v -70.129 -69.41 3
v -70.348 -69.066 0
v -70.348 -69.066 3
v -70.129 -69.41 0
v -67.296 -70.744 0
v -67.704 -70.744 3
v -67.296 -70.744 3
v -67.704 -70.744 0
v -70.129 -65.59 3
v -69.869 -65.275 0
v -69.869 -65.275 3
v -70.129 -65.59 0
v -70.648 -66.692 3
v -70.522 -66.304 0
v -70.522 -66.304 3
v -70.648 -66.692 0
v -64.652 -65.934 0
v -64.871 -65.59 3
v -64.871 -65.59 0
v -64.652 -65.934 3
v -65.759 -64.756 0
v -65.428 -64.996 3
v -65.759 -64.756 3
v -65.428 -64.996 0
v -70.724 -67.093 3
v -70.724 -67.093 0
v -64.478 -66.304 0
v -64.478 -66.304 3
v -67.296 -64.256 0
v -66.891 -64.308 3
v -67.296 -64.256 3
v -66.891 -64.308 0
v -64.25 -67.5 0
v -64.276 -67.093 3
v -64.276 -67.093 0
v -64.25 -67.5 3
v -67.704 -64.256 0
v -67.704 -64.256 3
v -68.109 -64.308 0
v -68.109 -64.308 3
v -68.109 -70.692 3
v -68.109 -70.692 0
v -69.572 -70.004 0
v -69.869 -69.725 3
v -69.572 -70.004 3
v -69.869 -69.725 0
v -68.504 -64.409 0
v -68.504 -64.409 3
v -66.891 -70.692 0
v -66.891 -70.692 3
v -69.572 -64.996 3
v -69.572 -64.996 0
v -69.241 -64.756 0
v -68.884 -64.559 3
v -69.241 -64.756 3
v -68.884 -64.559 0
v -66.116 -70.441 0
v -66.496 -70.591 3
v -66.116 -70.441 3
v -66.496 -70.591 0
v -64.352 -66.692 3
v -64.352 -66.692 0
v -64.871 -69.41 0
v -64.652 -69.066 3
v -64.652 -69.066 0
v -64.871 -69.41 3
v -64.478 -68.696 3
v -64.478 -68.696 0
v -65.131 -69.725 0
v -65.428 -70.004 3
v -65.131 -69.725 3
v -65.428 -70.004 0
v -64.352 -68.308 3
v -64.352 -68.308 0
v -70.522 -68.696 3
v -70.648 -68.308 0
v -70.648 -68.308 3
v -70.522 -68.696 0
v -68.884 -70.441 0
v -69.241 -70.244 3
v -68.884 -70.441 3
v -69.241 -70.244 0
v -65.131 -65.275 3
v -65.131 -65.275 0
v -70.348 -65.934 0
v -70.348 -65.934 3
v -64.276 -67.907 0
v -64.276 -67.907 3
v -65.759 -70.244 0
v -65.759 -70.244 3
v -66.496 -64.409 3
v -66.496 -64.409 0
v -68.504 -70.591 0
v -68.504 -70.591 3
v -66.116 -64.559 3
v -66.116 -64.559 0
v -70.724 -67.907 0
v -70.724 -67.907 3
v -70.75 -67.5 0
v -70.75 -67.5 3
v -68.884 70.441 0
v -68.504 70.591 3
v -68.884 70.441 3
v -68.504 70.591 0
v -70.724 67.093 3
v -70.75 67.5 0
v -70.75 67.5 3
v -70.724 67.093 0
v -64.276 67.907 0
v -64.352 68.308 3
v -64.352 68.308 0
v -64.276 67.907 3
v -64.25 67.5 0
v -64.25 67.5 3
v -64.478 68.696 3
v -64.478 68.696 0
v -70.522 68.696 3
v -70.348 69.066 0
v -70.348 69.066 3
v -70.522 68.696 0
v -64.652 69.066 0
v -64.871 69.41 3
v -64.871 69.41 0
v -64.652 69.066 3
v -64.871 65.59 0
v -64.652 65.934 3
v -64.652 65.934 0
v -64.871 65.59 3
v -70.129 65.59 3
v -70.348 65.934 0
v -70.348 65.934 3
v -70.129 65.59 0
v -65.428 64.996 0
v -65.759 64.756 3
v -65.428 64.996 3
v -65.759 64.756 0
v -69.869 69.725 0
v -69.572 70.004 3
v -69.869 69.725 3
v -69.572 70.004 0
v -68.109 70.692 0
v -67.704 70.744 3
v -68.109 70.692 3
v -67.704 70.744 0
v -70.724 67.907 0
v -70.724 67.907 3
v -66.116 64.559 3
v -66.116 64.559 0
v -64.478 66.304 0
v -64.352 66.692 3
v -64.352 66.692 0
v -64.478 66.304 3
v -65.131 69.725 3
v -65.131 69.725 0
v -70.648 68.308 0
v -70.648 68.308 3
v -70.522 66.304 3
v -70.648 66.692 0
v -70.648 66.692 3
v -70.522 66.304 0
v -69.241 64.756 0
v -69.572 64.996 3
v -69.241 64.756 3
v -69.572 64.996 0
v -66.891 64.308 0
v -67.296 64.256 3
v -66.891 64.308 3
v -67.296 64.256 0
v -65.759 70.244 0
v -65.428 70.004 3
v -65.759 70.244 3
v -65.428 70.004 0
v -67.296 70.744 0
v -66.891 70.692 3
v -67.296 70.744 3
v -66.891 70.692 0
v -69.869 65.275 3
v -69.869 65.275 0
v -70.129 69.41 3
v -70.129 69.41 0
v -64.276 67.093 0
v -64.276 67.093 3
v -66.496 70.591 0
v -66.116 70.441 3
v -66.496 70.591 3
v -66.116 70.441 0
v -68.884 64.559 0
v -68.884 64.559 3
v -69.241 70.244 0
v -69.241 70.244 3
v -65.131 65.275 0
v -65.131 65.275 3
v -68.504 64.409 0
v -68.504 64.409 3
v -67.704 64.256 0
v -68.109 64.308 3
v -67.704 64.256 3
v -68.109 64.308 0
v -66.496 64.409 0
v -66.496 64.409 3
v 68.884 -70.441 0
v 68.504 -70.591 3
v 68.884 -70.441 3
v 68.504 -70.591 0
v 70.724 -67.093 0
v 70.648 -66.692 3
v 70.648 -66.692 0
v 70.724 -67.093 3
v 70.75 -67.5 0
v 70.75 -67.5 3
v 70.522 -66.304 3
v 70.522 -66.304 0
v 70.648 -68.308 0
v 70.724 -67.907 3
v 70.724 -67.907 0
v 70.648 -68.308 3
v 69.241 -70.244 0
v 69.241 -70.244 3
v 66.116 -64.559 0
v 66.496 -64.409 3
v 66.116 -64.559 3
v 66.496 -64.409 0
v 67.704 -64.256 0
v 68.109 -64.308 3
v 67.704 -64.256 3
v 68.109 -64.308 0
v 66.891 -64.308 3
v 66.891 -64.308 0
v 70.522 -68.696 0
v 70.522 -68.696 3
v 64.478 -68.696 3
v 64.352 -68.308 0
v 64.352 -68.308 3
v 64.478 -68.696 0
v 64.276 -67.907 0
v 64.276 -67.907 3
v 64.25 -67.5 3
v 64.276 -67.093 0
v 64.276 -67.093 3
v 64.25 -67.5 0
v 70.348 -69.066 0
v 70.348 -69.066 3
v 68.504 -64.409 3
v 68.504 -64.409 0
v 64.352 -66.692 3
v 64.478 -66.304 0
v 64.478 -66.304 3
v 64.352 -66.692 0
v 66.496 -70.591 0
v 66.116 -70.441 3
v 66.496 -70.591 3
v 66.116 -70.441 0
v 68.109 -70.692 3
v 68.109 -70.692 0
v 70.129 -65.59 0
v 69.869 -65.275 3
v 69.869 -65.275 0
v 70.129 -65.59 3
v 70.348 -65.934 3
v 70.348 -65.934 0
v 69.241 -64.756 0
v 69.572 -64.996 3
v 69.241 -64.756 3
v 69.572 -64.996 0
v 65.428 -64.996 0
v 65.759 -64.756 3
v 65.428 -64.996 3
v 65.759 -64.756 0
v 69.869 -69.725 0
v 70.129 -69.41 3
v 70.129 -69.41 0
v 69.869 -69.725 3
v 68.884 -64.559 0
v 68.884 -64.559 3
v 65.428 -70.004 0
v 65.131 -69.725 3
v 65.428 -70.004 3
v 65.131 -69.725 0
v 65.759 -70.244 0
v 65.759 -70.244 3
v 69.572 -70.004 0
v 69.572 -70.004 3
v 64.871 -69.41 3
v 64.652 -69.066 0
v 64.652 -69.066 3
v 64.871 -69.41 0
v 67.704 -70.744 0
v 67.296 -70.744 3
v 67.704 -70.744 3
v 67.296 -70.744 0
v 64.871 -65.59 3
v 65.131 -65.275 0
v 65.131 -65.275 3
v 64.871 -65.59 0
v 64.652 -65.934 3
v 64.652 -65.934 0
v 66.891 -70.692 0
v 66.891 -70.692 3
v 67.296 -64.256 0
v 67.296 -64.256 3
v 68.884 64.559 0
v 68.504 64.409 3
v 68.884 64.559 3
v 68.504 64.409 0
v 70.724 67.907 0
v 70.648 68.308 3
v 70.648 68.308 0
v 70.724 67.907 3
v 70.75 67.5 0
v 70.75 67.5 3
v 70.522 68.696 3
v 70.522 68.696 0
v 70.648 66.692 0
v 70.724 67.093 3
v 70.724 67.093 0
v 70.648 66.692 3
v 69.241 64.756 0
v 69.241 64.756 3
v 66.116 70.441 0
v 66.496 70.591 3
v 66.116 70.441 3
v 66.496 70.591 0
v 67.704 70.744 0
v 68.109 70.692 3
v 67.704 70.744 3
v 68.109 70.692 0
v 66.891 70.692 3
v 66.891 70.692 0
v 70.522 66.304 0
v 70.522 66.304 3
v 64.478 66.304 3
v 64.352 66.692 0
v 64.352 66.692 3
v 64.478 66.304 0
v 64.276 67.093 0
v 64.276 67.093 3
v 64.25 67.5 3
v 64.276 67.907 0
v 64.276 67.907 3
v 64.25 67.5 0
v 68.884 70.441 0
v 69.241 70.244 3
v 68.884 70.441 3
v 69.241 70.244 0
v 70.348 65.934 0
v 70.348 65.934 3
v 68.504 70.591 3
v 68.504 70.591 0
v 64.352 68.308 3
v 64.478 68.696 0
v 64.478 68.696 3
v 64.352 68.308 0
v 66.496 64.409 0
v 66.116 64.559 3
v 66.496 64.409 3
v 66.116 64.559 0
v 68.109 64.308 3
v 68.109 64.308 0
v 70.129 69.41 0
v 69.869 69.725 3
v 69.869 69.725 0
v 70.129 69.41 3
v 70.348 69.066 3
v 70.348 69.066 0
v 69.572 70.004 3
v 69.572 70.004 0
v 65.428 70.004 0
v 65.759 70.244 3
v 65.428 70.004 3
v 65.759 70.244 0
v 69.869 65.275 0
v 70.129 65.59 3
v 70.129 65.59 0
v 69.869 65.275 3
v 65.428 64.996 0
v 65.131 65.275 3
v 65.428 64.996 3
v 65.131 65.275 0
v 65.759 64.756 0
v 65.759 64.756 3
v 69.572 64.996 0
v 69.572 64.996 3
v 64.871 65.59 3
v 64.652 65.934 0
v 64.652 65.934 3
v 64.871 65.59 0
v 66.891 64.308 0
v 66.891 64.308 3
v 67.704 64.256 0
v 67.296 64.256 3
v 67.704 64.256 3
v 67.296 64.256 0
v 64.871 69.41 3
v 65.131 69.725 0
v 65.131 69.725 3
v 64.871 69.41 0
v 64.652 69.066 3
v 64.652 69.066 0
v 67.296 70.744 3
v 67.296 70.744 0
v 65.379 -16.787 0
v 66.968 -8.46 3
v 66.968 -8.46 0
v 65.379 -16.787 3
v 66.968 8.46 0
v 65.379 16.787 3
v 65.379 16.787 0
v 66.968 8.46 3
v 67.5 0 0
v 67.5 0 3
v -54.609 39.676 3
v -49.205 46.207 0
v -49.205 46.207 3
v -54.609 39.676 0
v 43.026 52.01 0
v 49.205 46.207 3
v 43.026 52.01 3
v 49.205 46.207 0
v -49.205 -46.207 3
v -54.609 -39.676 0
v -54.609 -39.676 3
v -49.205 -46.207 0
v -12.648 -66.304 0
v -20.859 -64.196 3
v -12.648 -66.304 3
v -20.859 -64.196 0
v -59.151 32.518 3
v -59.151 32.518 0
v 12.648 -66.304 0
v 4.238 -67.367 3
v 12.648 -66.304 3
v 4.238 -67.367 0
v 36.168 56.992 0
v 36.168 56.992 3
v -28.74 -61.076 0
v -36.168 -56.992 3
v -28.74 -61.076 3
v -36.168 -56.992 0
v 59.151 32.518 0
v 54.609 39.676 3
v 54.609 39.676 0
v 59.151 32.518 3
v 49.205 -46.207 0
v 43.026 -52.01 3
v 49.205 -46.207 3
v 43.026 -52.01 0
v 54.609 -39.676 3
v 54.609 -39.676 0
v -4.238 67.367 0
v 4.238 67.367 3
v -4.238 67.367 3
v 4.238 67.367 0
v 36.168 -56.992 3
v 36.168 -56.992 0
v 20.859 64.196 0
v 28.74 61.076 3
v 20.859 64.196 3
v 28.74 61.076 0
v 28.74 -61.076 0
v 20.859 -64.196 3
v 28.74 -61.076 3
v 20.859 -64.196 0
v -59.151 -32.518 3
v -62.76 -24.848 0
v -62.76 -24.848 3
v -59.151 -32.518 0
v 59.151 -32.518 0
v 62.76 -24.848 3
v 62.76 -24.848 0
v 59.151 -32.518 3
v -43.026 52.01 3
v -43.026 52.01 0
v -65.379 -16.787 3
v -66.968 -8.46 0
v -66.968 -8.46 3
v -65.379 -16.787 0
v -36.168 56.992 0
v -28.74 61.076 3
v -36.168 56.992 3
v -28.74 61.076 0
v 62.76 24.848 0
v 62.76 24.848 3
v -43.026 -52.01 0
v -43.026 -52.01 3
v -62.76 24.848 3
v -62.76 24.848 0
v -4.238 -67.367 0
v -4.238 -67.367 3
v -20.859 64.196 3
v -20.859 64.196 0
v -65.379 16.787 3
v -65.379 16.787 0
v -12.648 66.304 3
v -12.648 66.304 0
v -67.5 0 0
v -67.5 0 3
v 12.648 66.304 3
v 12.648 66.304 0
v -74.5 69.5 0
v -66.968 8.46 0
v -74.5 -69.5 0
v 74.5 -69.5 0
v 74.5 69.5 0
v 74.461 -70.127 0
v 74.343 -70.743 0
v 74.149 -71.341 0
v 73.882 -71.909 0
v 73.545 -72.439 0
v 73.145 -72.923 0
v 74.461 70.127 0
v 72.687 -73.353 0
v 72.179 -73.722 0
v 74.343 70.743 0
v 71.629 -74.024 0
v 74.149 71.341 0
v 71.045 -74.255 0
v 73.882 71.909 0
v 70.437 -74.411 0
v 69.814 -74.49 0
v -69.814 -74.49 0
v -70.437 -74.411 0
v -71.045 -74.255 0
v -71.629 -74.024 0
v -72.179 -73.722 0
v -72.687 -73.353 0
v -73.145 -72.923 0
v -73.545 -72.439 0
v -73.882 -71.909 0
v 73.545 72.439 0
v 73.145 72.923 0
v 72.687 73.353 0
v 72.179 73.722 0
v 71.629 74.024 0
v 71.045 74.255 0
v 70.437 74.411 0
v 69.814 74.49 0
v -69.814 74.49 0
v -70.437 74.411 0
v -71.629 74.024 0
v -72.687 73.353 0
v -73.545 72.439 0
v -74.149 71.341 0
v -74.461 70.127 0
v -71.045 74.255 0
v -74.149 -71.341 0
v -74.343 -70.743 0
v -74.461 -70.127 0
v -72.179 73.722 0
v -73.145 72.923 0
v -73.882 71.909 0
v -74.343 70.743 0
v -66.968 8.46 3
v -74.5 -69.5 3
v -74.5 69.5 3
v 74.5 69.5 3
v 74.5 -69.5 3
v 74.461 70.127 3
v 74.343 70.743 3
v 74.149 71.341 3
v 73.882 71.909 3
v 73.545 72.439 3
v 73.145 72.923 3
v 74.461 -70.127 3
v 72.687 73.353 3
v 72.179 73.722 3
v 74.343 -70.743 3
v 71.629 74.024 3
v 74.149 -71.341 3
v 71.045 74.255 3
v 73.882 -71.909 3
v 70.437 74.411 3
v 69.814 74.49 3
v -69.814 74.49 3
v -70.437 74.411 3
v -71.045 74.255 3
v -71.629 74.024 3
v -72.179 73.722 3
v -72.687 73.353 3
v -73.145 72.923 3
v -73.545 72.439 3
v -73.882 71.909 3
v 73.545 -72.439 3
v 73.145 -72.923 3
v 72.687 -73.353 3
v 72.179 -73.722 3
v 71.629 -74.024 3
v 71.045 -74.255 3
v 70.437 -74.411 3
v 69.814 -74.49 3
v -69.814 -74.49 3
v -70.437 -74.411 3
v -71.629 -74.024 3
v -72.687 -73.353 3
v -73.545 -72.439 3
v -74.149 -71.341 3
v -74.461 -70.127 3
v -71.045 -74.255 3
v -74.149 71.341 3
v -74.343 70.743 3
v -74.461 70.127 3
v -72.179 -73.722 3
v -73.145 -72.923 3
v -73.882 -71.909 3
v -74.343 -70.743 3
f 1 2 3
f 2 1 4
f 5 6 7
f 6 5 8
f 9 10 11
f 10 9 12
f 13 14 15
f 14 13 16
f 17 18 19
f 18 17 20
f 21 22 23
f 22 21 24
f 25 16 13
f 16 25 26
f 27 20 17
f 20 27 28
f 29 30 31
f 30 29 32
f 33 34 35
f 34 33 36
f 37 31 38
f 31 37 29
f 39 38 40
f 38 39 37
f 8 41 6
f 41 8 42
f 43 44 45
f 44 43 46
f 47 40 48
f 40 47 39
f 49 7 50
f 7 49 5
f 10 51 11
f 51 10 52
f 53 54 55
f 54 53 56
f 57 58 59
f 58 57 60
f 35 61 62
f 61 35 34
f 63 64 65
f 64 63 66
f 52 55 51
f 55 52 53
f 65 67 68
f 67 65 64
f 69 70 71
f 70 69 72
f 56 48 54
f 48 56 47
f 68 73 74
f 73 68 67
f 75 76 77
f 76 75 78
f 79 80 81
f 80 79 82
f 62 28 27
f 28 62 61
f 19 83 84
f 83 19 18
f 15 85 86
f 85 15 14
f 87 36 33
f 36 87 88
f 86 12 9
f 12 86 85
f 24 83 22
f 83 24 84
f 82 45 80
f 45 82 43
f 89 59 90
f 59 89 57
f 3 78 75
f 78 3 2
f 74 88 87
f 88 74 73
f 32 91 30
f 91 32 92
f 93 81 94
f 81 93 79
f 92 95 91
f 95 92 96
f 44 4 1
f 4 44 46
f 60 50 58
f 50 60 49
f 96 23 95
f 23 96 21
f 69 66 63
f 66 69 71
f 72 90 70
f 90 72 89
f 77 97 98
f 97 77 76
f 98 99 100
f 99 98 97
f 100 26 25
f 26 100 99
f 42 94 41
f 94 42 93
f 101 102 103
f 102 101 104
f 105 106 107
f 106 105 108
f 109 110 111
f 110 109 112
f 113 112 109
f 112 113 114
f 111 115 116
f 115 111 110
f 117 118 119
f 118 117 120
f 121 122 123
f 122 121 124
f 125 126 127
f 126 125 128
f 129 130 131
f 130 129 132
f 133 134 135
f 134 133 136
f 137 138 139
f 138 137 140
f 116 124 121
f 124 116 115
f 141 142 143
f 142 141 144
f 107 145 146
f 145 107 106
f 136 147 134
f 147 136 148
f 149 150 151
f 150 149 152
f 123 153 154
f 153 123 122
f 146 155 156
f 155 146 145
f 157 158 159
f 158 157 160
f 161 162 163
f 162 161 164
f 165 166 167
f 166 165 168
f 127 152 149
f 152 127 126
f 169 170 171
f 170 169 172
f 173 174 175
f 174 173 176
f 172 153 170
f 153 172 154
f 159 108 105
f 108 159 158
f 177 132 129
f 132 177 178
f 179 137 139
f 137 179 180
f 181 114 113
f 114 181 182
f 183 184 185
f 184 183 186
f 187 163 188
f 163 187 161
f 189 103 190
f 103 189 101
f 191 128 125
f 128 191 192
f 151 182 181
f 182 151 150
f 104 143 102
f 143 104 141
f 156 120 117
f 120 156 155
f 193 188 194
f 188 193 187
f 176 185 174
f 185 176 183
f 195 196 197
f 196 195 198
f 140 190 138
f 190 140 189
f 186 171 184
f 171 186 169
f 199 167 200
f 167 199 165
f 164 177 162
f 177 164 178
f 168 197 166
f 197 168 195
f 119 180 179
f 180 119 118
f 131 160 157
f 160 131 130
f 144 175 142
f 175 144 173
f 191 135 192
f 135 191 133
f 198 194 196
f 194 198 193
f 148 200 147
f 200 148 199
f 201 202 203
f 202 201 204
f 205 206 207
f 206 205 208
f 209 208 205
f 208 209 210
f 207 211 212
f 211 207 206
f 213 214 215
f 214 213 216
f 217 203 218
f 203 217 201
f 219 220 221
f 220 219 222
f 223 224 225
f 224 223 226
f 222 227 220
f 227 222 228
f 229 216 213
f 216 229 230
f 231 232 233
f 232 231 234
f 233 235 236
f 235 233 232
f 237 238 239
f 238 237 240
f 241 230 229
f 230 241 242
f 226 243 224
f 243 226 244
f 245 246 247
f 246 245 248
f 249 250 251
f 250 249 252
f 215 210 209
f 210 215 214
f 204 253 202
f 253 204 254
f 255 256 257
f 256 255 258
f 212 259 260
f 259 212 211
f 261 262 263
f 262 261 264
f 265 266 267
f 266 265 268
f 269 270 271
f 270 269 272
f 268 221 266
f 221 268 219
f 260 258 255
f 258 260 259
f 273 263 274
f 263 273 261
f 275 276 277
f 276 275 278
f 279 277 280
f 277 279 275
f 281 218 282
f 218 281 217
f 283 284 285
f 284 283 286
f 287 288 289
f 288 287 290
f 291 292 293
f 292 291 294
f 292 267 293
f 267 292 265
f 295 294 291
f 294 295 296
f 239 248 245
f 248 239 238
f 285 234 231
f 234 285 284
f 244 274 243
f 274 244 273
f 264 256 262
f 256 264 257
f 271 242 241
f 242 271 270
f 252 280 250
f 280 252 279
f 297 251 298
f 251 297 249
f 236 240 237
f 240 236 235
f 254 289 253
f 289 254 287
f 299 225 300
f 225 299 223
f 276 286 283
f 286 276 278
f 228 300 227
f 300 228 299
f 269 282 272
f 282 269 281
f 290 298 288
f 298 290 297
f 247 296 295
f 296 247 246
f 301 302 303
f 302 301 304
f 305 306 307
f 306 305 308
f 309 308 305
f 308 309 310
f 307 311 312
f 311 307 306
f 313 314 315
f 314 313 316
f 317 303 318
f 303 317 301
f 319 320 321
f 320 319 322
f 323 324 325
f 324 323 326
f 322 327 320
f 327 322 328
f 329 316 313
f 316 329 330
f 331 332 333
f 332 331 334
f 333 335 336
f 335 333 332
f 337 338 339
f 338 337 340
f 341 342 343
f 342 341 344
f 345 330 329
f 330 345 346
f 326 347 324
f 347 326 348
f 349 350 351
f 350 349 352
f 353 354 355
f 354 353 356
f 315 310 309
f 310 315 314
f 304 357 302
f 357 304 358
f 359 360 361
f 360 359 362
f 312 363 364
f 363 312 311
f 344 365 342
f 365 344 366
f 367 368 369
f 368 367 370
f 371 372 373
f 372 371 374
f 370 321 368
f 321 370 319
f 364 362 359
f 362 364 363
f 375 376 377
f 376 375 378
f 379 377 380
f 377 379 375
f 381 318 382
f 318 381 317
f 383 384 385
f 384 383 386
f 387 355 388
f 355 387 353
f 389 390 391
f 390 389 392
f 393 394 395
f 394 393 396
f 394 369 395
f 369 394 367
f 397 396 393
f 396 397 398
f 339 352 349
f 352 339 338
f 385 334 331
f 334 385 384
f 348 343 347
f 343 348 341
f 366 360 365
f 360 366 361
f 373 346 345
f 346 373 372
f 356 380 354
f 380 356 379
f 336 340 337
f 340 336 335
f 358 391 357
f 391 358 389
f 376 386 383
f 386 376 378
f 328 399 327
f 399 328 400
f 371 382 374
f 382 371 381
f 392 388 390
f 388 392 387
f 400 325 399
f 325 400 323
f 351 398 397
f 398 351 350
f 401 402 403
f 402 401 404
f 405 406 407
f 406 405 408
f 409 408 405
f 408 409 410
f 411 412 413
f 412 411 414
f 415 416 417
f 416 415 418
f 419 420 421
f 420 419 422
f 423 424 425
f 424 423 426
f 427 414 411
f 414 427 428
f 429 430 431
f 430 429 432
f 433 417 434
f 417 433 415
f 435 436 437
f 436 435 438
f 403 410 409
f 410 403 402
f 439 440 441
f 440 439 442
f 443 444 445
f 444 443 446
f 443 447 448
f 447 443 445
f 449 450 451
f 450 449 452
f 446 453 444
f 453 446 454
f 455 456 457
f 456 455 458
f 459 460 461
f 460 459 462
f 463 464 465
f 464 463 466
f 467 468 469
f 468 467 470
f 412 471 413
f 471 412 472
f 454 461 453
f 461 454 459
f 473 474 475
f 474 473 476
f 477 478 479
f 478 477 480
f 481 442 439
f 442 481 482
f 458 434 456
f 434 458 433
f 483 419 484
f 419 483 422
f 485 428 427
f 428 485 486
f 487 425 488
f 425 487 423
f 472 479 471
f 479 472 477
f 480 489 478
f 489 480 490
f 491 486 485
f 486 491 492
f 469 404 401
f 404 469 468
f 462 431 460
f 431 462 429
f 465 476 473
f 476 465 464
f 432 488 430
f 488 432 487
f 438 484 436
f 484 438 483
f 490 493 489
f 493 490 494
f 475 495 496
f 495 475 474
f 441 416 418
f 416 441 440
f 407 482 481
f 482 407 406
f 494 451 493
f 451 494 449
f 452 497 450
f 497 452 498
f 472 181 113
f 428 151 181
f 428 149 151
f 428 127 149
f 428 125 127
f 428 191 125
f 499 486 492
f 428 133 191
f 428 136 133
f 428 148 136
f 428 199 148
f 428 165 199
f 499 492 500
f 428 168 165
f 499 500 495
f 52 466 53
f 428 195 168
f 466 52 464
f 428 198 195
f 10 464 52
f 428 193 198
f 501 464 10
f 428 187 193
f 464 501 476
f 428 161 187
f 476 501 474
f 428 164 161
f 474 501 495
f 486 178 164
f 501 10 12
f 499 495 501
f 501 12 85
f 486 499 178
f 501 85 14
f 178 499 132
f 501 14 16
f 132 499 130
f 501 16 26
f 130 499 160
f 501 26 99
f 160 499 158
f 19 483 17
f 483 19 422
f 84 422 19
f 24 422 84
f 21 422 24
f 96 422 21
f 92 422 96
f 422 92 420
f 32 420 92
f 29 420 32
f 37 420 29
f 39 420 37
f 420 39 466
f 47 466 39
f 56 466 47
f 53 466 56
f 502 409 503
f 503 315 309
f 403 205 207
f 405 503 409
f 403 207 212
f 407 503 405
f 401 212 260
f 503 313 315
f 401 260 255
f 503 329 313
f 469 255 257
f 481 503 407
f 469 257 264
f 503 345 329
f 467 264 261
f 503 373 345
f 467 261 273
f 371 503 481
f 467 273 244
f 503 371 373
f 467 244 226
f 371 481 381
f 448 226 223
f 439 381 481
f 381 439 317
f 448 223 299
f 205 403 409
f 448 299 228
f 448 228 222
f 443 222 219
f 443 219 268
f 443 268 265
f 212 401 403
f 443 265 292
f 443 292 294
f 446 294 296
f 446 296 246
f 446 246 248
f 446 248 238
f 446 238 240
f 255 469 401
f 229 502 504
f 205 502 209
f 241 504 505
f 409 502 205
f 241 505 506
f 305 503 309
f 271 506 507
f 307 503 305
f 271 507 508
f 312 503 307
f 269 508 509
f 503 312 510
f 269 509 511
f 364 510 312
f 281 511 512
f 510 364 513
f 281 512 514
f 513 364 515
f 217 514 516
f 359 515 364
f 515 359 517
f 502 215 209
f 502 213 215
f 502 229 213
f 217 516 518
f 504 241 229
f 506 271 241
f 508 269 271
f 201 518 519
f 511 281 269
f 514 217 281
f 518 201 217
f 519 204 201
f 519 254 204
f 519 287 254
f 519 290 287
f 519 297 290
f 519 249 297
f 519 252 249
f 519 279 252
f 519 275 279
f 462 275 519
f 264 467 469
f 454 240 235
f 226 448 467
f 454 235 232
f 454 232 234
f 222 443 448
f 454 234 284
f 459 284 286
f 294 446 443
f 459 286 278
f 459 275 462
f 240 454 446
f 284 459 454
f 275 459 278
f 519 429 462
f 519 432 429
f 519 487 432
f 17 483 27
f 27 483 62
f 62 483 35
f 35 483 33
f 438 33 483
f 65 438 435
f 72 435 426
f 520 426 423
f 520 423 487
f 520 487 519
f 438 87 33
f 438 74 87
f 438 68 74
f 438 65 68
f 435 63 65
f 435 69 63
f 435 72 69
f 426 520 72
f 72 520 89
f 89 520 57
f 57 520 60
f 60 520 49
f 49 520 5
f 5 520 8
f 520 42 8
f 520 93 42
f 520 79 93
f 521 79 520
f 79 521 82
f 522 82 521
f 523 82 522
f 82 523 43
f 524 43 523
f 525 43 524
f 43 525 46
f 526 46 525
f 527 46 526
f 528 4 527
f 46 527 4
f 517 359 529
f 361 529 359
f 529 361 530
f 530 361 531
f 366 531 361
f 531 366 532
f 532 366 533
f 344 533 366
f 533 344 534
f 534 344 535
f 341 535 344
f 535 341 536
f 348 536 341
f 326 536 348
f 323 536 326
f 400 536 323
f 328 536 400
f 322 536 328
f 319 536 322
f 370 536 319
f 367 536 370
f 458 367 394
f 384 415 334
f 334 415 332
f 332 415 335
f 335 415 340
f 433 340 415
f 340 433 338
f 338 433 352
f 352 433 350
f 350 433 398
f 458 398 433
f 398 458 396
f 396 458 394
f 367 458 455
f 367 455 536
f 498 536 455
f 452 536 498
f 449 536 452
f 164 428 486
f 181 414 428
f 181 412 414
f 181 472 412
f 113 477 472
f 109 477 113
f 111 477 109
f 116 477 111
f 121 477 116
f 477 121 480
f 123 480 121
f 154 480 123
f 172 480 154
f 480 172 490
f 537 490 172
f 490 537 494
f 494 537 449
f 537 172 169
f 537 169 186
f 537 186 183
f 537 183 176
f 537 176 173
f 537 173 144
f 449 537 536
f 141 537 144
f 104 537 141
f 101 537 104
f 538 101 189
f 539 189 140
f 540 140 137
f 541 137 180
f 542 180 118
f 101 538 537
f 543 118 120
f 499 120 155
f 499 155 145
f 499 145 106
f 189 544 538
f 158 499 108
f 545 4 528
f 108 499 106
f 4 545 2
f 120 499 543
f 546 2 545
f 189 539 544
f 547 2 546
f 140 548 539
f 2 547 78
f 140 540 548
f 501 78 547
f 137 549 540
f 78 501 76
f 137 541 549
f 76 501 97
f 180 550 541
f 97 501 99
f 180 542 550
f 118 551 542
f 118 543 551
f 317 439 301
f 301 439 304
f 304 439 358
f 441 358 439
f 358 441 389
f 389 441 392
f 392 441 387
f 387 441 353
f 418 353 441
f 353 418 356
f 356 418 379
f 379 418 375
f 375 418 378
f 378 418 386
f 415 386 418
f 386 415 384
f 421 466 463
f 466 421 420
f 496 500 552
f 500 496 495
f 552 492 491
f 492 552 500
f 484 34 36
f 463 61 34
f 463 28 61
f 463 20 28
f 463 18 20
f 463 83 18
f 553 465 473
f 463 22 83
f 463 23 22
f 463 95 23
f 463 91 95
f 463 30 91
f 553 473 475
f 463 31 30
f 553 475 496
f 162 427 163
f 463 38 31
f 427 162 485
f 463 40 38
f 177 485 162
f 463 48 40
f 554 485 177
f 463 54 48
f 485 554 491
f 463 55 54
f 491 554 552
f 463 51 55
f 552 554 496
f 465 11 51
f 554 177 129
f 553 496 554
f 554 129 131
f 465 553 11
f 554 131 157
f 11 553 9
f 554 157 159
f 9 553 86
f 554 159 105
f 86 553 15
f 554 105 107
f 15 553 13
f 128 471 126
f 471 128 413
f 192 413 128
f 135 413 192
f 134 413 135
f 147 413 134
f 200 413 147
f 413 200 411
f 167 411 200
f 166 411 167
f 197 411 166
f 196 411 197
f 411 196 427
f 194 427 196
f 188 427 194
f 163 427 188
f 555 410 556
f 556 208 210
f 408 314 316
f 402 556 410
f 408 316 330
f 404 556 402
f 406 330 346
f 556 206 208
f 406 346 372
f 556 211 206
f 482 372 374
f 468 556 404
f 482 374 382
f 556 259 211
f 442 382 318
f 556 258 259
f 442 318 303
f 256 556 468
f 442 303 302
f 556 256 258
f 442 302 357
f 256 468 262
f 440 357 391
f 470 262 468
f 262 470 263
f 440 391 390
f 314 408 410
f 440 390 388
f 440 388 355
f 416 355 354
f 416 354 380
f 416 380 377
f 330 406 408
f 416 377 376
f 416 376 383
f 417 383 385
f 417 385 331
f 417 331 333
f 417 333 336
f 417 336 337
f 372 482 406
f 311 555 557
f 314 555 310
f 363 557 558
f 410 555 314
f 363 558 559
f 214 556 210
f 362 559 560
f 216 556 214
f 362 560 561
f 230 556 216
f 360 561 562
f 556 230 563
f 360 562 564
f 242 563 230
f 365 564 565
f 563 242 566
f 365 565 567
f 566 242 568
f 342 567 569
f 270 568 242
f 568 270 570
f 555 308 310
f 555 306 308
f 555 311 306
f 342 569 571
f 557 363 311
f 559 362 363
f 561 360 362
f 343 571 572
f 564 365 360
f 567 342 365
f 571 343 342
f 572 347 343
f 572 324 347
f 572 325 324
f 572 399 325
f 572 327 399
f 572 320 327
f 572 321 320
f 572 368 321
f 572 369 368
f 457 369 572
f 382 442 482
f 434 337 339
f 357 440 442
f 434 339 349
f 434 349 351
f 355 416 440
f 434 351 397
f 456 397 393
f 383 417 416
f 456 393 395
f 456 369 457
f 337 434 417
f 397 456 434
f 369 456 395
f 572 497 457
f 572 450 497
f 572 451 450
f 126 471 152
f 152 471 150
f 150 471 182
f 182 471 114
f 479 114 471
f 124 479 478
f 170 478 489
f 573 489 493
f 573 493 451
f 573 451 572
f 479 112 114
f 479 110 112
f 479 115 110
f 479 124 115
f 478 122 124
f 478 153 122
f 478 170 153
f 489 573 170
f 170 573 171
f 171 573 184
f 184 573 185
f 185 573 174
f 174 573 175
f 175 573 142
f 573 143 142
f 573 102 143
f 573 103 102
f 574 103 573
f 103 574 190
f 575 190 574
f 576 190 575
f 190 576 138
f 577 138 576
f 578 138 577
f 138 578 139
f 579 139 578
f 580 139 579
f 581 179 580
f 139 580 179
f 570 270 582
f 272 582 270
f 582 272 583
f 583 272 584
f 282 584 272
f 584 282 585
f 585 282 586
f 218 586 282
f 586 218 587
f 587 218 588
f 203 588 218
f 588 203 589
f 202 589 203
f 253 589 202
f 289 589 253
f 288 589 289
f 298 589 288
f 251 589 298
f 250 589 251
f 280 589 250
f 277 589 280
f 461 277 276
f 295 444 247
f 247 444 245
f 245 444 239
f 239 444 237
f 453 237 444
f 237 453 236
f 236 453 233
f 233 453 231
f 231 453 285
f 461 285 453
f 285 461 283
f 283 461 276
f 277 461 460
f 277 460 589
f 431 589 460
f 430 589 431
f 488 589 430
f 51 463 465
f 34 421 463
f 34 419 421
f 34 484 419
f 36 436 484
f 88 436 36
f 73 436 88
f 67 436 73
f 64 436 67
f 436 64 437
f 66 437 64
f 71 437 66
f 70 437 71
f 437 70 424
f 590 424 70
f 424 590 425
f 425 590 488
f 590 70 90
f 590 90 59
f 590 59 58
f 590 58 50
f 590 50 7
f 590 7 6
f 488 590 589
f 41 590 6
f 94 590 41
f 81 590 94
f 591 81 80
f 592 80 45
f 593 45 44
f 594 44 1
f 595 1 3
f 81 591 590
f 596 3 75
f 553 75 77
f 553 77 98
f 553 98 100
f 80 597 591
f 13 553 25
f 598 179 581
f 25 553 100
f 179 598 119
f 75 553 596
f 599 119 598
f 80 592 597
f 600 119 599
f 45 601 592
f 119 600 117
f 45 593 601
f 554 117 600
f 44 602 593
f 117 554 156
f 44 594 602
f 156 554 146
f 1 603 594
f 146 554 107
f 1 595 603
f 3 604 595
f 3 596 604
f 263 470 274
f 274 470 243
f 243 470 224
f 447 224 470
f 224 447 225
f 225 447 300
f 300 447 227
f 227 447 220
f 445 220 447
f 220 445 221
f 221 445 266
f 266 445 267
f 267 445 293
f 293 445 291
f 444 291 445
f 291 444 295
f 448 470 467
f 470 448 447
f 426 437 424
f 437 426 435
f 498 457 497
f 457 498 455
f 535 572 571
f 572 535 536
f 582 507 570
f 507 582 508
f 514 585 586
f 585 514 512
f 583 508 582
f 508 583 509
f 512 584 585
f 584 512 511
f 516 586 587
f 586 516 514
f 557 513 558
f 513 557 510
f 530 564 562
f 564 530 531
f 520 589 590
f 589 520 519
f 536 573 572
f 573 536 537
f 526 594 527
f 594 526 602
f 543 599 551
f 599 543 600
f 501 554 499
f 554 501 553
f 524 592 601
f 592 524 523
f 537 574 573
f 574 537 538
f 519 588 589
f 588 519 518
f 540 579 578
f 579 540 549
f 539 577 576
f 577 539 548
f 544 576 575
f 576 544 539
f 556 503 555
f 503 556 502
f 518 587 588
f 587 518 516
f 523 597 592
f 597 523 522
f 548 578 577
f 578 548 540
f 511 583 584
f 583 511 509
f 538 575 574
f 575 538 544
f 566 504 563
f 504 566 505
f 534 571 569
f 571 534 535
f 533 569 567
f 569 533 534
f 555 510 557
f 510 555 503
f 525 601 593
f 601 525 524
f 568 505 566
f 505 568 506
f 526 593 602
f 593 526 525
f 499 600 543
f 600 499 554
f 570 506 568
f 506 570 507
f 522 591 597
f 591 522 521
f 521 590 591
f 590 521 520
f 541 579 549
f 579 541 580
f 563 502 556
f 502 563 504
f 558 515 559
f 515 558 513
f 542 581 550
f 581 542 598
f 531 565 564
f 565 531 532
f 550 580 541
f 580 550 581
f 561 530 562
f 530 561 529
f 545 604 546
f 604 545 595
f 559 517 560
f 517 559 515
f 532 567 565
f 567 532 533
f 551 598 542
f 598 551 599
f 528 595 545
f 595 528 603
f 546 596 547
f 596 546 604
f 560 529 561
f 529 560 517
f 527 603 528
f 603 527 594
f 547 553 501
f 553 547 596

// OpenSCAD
$fn = 50;


difference() {
	union() {
		hull() {
			translate(v = [-69.5000000000, 69.5000000000, 0]) {
				cylinder(h = 3, r = 5);
			}
			translate(v = [69.5000000000, 69.5000000000, 0]) {
				cylinder(h = 3, r = 5);
			}
			translate(v = [-69.5000000000, -69.5000000000, 0]) {
				cylinder(h = 3, r = 5);
			}
			translate(v = [69.5000000000, -69.5000000000, 0]) {
				cylinder(h = 3, r = 5);
			}
		}
	}
	union() {
		#translate(v = [-67.5000000000, -67.5000000000, -100.0000000000]) {
			cylinder(h = 200, r = 3.2500000000);
		}
		#translate(v = [-67.5000000000, 67.5000000000, -100.0000000000]) {
			cylinder(h = 200, r = 3.2500000000);
		}
		#translate(v = [67.5000000000, -67.5000000000, -100.0000000000]) {
			cylinder(h = 200, r = 3.2500000000);
		}
		#translate(v = [67.5000000000, 67.5000000000, -100.0000000000]) {
			cylinder(h = 200, r = 3.2500000000);
		}
		#cylinder(h = 3, r = 67.5000000000);
	}
}
